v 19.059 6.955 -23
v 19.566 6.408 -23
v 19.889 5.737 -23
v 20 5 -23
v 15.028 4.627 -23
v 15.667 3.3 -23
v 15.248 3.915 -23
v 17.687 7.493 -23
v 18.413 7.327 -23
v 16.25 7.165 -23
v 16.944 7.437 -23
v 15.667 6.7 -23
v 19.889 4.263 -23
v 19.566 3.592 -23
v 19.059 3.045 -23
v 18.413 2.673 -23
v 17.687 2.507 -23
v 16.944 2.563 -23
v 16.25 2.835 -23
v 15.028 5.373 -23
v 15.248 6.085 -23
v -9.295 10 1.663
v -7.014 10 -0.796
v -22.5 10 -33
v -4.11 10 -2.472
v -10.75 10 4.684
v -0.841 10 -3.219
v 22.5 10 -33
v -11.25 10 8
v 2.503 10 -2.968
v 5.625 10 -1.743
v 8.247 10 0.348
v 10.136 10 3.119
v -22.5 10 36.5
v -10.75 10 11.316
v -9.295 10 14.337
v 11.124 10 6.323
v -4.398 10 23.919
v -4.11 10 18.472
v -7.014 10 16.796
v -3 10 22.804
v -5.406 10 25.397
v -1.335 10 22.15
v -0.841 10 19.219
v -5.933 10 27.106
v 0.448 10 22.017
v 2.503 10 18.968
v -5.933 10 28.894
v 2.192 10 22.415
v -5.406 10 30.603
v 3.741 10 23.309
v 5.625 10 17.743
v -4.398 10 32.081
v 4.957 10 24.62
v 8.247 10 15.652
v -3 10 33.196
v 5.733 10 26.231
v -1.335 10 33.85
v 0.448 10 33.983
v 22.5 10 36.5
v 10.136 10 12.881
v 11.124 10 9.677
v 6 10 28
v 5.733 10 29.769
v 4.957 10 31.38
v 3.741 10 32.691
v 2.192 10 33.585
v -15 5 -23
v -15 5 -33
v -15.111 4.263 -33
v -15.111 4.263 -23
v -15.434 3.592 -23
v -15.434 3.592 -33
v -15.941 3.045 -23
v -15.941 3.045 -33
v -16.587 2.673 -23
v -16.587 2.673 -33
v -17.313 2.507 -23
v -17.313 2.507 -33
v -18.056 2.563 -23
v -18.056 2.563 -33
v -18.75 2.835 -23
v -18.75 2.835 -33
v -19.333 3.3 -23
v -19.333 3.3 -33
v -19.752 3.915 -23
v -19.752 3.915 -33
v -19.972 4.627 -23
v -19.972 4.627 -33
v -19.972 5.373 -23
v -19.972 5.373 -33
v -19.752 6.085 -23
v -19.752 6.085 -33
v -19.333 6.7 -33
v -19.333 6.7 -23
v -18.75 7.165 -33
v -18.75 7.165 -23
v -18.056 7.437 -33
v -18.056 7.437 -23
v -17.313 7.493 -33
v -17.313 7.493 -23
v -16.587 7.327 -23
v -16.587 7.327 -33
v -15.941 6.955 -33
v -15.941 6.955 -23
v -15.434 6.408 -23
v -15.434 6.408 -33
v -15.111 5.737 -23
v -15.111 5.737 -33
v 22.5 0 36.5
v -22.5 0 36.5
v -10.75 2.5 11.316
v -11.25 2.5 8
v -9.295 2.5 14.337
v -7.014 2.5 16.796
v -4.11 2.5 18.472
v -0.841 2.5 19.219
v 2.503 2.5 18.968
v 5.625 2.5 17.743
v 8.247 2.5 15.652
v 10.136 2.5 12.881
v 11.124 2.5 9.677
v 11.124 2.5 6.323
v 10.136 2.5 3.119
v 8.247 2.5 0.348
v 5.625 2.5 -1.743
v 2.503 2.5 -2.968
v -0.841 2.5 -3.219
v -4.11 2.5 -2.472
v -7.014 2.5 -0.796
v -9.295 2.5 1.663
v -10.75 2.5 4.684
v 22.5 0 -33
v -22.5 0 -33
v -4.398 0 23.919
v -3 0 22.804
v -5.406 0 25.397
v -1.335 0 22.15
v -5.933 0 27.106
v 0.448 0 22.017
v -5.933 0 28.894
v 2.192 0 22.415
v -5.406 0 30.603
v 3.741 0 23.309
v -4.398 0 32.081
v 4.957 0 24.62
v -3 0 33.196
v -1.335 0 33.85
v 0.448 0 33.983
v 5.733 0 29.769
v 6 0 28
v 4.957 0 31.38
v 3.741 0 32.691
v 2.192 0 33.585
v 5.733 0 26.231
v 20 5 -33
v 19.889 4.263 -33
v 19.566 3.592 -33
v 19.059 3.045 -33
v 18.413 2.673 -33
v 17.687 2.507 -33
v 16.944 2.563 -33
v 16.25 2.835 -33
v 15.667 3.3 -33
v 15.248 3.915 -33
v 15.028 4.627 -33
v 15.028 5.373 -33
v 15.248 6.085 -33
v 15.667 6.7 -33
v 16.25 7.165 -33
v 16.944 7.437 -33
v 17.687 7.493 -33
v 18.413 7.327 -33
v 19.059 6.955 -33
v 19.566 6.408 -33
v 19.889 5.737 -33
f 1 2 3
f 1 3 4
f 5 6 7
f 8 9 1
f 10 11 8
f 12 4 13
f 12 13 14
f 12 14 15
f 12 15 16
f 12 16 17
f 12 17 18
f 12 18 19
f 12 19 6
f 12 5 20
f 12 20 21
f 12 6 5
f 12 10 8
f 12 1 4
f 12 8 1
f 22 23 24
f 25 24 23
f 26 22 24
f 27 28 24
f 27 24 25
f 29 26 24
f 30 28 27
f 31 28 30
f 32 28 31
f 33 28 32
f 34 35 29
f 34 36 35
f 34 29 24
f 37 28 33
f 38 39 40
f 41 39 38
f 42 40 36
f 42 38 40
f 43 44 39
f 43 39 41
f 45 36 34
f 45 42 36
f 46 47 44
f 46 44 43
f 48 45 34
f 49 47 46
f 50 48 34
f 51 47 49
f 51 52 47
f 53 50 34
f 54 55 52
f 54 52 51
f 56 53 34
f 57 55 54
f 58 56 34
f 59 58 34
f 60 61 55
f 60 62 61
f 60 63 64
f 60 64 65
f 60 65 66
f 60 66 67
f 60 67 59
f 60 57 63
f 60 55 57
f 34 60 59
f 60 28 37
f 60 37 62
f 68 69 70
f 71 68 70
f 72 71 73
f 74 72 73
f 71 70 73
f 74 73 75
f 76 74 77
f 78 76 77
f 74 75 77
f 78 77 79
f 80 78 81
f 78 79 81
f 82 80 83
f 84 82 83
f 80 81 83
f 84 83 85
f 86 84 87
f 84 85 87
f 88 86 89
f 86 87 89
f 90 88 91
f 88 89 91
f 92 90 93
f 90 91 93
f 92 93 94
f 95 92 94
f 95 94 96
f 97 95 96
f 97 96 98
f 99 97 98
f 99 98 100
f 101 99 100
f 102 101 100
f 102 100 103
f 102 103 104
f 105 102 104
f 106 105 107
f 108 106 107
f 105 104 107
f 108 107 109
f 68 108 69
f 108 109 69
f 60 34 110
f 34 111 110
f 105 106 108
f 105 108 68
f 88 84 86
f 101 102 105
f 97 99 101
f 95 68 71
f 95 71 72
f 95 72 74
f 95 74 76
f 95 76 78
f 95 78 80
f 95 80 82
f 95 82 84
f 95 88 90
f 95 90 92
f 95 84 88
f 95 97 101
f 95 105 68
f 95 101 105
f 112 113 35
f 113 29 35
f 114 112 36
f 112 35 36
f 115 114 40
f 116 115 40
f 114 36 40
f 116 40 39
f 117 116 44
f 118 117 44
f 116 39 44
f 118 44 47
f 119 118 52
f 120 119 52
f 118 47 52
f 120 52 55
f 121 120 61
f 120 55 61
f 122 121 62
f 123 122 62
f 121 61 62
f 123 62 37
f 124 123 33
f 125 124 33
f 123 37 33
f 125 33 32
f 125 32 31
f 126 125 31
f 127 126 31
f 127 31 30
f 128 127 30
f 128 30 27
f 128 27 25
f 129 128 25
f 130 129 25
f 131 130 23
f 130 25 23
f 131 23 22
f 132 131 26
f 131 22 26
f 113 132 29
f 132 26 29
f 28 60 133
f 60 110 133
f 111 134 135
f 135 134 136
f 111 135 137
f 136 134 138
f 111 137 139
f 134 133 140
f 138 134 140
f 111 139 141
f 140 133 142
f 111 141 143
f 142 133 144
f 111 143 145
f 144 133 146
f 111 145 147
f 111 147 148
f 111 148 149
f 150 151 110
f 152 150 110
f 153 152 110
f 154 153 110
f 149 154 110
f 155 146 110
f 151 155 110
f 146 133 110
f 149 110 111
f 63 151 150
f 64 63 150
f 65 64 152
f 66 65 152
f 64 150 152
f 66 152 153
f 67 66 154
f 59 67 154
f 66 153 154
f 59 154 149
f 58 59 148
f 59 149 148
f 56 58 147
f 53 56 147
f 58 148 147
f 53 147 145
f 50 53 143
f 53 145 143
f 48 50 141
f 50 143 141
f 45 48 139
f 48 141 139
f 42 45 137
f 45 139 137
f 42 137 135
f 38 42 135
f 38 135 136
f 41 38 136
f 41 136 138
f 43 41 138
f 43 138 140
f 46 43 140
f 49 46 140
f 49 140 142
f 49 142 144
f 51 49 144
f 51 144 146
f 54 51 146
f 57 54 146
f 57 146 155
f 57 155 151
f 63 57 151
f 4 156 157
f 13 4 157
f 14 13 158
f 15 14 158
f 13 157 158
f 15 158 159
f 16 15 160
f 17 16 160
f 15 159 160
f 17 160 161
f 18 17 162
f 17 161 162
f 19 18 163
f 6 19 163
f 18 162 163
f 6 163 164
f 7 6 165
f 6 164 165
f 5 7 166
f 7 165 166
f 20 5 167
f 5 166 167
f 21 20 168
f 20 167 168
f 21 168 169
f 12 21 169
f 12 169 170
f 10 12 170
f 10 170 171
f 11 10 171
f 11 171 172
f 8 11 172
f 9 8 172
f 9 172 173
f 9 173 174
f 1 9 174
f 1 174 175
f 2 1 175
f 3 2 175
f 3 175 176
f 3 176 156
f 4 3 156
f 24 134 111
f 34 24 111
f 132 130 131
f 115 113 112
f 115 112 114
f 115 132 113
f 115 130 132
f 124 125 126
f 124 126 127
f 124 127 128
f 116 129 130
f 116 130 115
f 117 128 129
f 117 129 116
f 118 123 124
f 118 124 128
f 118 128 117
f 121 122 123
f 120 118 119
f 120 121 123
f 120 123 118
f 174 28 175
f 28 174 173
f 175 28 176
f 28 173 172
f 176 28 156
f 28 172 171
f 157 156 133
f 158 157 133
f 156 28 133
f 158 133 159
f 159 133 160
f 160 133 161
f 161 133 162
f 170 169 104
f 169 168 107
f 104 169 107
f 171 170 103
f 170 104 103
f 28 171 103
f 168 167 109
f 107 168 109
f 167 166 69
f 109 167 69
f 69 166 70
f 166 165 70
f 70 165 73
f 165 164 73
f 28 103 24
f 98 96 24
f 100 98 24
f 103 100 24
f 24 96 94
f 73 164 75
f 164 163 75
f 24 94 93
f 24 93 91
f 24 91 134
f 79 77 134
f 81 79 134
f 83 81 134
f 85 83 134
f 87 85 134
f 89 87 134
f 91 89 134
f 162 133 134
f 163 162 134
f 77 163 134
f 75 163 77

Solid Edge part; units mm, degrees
sketch "Sketch1" plane through (0, 0, 0) normal (0, -1, 0) x (1, 0, 0)
  line L0 (22.5, 36.5) -> (22.5, -33)
  line L1 (22.5, -33) -> (-22.5, -33)
  line L2 (-22.5, -33) -> (-22.5, 36.5)
  line L3 (-22.5, 36.5) -> (22.5, 36.5)
  circle A0 centre (0, 28) radius 6
  circle A1 centre (0, 8) radius 4.6
  dimension "D1" = 9.2
  dimension "D2" = 8
  dimension "D3" = 11.2
  dimension "D4" = 5.6
  dimension "D5" = 15
  dimension "D6" = 24
  dimension "D7" = 45
  dimension "D8" = 17
  dimension "D9" = 13.5
  dimension "D10" = 12
  dimension "D11" = 20
extrude "Protrusion1" add sketch "Sketch1" against normal blind 10
sketch "Sketch2" plane through (0, 10, 4.6) normal (0, 1, 0) x (-1, 0, 0)
  circle A0 centre (0, 3.4) radius 11.25
extrude "ExtrudedCutout_1" cut sketch "Sketch2" against normal blind 7.5
sketch "Sketch3" plane through (0, 5, -33) normal (0, 0, -1) x (1, 0, 0)
  circle A0 centre (-17.5, 0) radius 2.5
extrude "ExtrudedCutout_2" cut sketch "Sketch3" against normal blind 10
sketch "Sketch4" plane through (0, 2.5, 8) normal (0, 1, 0) x (-1, 0, 0)
  circle A0 centre (0, 0) radius 4.6
extrude "Protrusion2" add sketch "Sketch4" against normal up to vertex (2.5 mm away)
sketch "Sketch5" plane through (0, 5, -33) normal (0, 0, -1) x (1, 0, 0)
  circle A0 centre (17.5, 0) radius 2.5
extrude "ExtrudedCutout_3" cut sketch "Sketch5" against normal blind 10
